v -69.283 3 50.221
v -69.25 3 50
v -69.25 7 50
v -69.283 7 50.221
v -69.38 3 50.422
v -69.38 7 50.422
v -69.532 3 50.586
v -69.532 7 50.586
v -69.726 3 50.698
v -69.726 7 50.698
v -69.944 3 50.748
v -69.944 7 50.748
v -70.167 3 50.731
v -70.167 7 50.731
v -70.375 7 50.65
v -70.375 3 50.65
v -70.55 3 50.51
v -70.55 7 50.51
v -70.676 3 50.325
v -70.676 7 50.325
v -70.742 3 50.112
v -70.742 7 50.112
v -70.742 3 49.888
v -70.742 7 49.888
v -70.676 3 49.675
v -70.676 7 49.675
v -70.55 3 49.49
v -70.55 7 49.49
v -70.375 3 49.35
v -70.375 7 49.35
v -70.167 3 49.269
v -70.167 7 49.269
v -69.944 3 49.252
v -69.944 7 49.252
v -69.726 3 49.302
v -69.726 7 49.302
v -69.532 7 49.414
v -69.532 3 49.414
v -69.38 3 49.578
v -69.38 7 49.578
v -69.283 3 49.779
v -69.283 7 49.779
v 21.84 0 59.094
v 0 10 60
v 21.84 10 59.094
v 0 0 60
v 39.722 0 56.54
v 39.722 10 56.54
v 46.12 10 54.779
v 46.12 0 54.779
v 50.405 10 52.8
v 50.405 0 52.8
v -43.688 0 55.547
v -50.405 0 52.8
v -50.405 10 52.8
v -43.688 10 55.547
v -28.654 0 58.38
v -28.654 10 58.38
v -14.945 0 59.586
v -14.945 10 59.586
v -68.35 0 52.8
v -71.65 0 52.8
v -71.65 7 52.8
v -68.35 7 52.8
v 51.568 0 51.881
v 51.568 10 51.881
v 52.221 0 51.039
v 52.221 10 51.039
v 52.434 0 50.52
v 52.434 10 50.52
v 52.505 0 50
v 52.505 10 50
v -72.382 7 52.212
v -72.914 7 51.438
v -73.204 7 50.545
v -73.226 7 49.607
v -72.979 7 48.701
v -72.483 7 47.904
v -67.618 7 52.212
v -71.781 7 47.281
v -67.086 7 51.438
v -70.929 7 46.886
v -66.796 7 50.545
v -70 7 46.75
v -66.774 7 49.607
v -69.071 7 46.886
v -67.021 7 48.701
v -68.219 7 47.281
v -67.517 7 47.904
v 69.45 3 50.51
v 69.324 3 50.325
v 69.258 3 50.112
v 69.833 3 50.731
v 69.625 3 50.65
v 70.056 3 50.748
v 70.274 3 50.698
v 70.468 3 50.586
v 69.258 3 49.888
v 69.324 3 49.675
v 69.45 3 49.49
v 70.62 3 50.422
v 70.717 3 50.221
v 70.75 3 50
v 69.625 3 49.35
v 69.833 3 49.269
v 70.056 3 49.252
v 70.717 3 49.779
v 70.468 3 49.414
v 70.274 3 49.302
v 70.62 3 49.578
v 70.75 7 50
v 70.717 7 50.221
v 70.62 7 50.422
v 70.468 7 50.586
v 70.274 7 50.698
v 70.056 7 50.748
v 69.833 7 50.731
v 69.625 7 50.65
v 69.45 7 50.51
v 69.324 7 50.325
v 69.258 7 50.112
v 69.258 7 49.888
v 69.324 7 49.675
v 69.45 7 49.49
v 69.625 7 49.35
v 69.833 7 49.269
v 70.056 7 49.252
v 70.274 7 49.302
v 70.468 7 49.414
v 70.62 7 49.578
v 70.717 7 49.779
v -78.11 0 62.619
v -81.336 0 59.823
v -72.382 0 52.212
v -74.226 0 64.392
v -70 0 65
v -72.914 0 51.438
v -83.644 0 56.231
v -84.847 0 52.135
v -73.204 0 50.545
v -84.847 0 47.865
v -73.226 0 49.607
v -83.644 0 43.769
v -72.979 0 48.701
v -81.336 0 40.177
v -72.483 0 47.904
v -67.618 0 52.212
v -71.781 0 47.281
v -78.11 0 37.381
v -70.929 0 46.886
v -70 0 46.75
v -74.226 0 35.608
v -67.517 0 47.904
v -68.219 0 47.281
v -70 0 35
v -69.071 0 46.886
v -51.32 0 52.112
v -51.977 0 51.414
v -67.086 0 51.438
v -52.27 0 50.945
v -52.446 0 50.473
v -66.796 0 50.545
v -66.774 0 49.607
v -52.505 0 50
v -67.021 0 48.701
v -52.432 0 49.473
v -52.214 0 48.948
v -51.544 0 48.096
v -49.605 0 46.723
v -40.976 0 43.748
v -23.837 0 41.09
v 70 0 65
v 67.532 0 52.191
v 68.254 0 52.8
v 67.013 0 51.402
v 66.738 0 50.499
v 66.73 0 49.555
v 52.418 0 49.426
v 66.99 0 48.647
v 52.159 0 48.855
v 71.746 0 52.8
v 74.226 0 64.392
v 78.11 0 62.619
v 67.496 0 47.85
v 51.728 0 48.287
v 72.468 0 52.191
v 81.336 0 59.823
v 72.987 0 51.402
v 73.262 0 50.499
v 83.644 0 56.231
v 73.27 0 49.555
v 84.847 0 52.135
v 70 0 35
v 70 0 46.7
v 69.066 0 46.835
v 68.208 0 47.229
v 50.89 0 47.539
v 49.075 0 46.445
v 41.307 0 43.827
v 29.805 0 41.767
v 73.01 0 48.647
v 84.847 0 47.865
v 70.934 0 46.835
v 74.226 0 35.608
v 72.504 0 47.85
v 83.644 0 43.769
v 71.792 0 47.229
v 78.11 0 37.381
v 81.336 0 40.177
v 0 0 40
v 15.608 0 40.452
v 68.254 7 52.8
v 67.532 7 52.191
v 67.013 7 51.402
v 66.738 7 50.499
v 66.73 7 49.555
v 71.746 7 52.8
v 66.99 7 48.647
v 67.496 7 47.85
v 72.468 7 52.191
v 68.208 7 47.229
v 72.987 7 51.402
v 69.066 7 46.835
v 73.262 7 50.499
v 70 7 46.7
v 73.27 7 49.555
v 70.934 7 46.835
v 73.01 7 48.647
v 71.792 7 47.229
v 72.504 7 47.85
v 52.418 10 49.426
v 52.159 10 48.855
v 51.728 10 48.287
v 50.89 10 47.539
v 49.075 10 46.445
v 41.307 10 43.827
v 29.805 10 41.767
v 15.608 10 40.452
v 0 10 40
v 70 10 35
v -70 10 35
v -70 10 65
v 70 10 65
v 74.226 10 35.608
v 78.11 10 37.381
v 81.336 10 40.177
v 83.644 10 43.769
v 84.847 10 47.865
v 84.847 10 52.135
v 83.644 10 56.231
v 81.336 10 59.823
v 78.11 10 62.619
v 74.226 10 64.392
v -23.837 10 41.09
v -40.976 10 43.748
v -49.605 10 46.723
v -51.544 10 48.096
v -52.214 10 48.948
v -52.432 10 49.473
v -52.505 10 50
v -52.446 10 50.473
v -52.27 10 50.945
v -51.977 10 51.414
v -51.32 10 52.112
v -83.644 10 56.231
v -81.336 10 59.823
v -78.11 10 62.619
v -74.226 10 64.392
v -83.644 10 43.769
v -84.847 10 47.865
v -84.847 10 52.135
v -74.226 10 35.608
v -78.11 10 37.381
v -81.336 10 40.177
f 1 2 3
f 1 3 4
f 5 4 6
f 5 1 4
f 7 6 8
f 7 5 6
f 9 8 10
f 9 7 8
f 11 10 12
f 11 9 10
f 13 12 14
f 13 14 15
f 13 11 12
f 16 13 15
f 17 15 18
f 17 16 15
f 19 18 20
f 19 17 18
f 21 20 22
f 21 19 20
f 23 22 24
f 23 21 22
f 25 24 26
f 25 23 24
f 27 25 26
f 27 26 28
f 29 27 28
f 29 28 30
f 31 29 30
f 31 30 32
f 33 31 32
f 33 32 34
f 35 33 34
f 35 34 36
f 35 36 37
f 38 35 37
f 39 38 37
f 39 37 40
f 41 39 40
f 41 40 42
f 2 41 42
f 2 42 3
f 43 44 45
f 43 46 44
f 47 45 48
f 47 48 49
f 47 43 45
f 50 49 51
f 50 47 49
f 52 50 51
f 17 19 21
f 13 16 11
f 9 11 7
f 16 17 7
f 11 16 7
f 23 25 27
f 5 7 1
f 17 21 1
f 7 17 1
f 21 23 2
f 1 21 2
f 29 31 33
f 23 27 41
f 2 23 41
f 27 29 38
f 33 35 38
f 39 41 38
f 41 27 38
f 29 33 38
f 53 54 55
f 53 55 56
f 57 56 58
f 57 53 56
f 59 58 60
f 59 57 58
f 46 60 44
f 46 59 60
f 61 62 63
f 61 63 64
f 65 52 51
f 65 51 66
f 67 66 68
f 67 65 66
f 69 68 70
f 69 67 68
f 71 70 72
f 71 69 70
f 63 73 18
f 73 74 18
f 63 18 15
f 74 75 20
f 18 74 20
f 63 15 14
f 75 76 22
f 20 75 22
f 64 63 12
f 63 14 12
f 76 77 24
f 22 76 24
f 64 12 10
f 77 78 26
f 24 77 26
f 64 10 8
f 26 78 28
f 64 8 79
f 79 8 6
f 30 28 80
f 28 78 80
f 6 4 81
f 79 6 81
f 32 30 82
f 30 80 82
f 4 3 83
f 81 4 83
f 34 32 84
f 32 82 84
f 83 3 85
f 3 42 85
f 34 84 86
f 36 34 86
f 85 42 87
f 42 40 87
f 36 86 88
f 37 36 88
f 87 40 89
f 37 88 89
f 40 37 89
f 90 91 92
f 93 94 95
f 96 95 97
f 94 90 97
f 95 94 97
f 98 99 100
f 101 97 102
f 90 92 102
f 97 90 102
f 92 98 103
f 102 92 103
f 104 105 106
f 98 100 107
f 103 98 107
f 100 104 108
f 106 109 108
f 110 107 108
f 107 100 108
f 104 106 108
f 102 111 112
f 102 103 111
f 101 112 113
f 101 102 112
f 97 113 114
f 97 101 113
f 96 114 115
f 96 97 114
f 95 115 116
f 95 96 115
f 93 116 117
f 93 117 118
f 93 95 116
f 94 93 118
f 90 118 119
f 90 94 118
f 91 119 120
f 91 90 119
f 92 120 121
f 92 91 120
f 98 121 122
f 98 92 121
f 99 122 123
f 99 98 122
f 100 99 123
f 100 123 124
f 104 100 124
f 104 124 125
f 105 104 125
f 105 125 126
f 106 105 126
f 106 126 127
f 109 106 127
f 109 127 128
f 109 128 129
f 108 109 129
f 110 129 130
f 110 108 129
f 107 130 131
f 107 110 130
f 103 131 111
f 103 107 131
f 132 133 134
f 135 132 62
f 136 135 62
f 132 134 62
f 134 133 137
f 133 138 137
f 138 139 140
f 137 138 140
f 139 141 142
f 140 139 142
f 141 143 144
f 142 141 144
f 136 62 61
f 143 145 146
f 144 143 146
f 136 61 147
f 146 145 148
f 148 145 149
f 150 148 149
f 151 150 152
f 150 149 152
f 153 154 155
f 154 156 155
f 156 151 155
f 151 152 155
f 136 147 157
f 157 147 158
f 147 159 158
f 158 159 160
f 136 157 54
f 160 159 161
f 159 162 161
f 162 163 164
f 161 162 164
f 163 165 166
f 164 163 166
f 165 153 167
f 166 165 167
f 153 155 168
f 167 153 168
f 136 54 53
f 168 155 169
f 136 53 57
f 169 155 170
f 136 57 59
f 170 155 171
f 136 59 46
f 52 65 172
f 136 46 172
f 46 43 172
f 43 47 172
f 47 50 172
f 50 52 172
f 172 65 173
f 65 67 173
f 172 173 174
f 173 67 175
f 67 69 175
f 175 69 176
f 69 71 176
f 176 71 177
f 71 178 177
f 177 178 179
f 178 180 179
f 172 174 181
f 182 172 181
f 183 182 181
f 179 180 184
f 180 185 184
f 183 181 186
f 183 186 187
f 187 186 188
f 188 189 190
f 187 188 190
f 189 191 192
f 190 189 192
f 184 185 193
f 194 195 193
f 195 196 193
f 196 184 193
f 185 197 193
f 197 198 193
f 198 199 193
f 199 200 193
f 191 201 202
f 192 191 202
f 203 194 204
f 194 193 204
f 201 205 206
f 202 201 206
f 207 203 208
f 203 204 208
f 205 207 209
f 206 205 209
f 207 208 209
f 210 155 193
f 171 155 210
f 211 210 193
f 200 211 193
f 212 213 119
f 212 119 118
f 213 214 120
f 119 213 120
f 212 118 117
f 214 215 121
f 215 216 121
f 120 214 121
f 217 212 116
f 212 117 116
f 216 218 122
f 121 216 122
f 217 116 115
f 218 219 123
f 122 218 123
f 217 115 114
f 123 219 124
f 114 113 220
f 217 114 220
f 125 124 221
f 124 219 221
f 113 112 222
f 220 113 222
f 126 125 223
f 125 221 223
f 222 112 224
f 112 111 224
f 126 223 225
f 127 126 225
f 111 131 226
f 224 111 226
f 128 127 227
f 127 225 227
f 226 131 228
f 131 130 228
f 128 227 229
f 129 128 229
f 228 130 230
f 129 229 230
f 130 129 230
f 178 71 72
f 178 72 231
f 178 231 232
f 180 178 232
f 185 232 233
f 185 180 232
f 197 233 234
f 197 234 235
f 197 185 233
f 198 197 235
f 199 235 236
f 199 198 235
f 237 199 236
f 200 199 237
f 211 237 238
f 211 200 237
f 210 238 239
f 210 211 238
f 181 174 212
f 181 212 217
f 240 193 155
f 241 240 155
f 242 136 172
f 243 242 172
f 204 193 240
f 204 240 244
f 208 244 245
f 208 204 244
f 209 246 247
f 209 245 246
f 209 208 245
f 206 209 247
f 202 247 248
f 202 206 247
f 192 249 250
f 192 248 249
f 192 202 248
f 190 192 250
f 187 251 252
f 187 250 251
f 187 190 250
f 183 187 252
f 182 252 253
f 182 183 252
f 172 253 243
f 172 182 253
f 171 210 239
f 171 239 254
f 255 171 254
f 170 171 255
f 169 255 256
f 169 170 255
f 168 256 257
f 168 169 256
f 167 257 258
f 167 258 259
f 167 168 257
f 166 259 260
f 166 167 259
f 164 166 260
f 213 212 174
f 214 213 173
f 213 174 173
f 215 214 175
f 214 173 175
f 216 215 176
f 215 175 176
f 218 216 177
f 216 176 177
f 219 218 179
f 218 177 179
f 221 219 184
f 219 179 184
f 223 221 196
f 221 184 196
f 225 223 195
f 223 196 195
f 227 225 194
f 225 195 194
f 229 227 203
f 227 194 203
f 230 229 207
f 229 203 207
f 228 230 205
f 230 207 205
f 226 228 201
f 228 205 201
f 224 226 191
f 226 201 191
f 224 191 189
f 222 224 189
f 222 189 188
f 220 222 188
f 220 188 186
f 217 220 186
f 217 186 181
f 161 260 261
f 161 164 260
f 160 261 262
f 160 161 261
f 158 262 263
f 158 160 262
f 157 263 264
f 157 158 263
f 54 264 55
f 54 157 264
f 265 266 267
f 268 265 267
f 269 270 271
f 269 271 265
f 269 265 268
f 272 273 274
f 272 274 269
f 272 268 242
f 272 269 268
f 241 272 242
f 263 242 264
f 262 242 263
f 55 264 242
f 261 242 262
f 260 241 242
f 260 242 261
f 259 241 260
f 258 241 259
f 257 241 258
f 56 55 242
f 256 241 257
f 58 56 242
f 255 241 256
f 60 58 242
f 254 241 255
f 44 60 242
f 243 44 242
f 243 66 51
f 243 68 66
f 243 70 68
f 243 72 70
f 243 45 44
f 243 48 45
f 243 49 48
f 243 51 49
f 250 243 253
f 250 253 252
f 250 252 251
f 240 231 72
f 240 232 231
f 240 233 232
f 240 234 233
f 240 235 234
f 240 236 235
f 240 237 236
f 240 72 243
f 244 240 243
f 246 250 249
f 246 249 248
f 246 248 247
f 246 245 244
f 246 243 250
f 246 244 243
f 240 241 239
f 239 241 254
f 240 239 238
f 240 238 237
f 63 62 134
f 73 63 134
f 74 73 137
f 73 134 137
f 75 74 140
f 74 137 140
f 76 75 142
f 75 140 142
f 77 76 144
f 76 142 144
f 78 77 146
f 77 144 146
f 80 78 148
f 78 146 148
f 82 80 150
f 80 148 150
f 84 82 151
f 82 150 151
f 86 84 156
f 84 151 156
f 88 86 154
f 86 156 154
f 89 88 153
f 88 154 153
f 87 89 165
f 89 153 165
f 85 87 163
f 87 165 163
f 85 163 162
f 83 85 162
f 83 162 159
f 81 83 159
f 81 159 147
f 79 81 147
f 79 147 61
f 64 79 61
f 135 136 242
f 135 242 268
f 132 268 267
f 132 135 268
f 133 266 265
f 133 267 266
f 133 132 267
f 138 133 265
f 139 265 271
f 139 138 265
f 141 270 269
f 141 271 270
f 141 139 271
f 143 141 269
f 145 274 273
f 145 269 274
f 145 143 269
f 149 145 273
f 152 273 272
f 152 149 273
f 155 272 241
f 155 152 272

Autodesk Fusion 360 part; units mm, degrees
sketch "Sketch2" plane through (0, 0, 0) normal (0, 1, 0) x (1, 0, 0)
  line L0 (0, -50) -> (80, -50)
  line L1 (0, -50) -> (-80, -50)
  line L2 (-80, -52.8) -> (80, -52.8)
  circle A0 centre (70, -50) radius 3.3
  circle A1 centre (-70, -50) radius 3.25
  line L3 (-70, -65) -> (70, -65)
  arc A2 (70, -65) -> (70, -35) centre (70, -50) ccw
  line L4 (70, -35) -> (-70, -35)
  arc A3 (-70, -35) -> (-70, -65) centre (-70, -50) ccw
  line L5 (-70, -50) -> (70, -50) construction
  ellipse E0 centre (0, -50) end of major axis (52.5047, -50) minor radius 10
  line L6 (-52.5047, -50) -> (52.5047, -50)
  line L7 (0, -60) -> (0, -40)
  circle A4 centre (-70, -50) radius 0.75
  circle A5 centre (70, -50) radius 0.75
  dimension "d7" = 80
  dimension "d8" = 80
  dimension "d9" = 2.8
  dimension "d10" = 6.6
  dimension "d11" = 6.5
  dimension "d12" = 30
  dimension "d13" = 20
  dimension "d14" = 1.5
  dimension "d15" = 1.5
extrude "Extrude1" add sketch "Sketch2" along normal blind 10 contours L0 L2 A0 E0 | L1 L2 A1 E0 | L0 A0 A5 | L0 L2 A0 A5 | L1 L2 A1 A4 | L1 A1 A4 | L0 A5 | L0 A5 | L2 A0 | L1 A4 | L1 A4 | L2 A1 | L3 A2 L4 A3
extrude "Extrude2" cut sketch "Sketch2" along normal blind 7 contours L0 A0 A5 | L0 L2 A0 A5 | L1 L2 A1 A4 | L1 A1 A4
extrude "Extrude3" cut sketch "Sketch2" along normal blind 3 contours L0 A5 | L0 A5 | L1 A4 | L1 A4
